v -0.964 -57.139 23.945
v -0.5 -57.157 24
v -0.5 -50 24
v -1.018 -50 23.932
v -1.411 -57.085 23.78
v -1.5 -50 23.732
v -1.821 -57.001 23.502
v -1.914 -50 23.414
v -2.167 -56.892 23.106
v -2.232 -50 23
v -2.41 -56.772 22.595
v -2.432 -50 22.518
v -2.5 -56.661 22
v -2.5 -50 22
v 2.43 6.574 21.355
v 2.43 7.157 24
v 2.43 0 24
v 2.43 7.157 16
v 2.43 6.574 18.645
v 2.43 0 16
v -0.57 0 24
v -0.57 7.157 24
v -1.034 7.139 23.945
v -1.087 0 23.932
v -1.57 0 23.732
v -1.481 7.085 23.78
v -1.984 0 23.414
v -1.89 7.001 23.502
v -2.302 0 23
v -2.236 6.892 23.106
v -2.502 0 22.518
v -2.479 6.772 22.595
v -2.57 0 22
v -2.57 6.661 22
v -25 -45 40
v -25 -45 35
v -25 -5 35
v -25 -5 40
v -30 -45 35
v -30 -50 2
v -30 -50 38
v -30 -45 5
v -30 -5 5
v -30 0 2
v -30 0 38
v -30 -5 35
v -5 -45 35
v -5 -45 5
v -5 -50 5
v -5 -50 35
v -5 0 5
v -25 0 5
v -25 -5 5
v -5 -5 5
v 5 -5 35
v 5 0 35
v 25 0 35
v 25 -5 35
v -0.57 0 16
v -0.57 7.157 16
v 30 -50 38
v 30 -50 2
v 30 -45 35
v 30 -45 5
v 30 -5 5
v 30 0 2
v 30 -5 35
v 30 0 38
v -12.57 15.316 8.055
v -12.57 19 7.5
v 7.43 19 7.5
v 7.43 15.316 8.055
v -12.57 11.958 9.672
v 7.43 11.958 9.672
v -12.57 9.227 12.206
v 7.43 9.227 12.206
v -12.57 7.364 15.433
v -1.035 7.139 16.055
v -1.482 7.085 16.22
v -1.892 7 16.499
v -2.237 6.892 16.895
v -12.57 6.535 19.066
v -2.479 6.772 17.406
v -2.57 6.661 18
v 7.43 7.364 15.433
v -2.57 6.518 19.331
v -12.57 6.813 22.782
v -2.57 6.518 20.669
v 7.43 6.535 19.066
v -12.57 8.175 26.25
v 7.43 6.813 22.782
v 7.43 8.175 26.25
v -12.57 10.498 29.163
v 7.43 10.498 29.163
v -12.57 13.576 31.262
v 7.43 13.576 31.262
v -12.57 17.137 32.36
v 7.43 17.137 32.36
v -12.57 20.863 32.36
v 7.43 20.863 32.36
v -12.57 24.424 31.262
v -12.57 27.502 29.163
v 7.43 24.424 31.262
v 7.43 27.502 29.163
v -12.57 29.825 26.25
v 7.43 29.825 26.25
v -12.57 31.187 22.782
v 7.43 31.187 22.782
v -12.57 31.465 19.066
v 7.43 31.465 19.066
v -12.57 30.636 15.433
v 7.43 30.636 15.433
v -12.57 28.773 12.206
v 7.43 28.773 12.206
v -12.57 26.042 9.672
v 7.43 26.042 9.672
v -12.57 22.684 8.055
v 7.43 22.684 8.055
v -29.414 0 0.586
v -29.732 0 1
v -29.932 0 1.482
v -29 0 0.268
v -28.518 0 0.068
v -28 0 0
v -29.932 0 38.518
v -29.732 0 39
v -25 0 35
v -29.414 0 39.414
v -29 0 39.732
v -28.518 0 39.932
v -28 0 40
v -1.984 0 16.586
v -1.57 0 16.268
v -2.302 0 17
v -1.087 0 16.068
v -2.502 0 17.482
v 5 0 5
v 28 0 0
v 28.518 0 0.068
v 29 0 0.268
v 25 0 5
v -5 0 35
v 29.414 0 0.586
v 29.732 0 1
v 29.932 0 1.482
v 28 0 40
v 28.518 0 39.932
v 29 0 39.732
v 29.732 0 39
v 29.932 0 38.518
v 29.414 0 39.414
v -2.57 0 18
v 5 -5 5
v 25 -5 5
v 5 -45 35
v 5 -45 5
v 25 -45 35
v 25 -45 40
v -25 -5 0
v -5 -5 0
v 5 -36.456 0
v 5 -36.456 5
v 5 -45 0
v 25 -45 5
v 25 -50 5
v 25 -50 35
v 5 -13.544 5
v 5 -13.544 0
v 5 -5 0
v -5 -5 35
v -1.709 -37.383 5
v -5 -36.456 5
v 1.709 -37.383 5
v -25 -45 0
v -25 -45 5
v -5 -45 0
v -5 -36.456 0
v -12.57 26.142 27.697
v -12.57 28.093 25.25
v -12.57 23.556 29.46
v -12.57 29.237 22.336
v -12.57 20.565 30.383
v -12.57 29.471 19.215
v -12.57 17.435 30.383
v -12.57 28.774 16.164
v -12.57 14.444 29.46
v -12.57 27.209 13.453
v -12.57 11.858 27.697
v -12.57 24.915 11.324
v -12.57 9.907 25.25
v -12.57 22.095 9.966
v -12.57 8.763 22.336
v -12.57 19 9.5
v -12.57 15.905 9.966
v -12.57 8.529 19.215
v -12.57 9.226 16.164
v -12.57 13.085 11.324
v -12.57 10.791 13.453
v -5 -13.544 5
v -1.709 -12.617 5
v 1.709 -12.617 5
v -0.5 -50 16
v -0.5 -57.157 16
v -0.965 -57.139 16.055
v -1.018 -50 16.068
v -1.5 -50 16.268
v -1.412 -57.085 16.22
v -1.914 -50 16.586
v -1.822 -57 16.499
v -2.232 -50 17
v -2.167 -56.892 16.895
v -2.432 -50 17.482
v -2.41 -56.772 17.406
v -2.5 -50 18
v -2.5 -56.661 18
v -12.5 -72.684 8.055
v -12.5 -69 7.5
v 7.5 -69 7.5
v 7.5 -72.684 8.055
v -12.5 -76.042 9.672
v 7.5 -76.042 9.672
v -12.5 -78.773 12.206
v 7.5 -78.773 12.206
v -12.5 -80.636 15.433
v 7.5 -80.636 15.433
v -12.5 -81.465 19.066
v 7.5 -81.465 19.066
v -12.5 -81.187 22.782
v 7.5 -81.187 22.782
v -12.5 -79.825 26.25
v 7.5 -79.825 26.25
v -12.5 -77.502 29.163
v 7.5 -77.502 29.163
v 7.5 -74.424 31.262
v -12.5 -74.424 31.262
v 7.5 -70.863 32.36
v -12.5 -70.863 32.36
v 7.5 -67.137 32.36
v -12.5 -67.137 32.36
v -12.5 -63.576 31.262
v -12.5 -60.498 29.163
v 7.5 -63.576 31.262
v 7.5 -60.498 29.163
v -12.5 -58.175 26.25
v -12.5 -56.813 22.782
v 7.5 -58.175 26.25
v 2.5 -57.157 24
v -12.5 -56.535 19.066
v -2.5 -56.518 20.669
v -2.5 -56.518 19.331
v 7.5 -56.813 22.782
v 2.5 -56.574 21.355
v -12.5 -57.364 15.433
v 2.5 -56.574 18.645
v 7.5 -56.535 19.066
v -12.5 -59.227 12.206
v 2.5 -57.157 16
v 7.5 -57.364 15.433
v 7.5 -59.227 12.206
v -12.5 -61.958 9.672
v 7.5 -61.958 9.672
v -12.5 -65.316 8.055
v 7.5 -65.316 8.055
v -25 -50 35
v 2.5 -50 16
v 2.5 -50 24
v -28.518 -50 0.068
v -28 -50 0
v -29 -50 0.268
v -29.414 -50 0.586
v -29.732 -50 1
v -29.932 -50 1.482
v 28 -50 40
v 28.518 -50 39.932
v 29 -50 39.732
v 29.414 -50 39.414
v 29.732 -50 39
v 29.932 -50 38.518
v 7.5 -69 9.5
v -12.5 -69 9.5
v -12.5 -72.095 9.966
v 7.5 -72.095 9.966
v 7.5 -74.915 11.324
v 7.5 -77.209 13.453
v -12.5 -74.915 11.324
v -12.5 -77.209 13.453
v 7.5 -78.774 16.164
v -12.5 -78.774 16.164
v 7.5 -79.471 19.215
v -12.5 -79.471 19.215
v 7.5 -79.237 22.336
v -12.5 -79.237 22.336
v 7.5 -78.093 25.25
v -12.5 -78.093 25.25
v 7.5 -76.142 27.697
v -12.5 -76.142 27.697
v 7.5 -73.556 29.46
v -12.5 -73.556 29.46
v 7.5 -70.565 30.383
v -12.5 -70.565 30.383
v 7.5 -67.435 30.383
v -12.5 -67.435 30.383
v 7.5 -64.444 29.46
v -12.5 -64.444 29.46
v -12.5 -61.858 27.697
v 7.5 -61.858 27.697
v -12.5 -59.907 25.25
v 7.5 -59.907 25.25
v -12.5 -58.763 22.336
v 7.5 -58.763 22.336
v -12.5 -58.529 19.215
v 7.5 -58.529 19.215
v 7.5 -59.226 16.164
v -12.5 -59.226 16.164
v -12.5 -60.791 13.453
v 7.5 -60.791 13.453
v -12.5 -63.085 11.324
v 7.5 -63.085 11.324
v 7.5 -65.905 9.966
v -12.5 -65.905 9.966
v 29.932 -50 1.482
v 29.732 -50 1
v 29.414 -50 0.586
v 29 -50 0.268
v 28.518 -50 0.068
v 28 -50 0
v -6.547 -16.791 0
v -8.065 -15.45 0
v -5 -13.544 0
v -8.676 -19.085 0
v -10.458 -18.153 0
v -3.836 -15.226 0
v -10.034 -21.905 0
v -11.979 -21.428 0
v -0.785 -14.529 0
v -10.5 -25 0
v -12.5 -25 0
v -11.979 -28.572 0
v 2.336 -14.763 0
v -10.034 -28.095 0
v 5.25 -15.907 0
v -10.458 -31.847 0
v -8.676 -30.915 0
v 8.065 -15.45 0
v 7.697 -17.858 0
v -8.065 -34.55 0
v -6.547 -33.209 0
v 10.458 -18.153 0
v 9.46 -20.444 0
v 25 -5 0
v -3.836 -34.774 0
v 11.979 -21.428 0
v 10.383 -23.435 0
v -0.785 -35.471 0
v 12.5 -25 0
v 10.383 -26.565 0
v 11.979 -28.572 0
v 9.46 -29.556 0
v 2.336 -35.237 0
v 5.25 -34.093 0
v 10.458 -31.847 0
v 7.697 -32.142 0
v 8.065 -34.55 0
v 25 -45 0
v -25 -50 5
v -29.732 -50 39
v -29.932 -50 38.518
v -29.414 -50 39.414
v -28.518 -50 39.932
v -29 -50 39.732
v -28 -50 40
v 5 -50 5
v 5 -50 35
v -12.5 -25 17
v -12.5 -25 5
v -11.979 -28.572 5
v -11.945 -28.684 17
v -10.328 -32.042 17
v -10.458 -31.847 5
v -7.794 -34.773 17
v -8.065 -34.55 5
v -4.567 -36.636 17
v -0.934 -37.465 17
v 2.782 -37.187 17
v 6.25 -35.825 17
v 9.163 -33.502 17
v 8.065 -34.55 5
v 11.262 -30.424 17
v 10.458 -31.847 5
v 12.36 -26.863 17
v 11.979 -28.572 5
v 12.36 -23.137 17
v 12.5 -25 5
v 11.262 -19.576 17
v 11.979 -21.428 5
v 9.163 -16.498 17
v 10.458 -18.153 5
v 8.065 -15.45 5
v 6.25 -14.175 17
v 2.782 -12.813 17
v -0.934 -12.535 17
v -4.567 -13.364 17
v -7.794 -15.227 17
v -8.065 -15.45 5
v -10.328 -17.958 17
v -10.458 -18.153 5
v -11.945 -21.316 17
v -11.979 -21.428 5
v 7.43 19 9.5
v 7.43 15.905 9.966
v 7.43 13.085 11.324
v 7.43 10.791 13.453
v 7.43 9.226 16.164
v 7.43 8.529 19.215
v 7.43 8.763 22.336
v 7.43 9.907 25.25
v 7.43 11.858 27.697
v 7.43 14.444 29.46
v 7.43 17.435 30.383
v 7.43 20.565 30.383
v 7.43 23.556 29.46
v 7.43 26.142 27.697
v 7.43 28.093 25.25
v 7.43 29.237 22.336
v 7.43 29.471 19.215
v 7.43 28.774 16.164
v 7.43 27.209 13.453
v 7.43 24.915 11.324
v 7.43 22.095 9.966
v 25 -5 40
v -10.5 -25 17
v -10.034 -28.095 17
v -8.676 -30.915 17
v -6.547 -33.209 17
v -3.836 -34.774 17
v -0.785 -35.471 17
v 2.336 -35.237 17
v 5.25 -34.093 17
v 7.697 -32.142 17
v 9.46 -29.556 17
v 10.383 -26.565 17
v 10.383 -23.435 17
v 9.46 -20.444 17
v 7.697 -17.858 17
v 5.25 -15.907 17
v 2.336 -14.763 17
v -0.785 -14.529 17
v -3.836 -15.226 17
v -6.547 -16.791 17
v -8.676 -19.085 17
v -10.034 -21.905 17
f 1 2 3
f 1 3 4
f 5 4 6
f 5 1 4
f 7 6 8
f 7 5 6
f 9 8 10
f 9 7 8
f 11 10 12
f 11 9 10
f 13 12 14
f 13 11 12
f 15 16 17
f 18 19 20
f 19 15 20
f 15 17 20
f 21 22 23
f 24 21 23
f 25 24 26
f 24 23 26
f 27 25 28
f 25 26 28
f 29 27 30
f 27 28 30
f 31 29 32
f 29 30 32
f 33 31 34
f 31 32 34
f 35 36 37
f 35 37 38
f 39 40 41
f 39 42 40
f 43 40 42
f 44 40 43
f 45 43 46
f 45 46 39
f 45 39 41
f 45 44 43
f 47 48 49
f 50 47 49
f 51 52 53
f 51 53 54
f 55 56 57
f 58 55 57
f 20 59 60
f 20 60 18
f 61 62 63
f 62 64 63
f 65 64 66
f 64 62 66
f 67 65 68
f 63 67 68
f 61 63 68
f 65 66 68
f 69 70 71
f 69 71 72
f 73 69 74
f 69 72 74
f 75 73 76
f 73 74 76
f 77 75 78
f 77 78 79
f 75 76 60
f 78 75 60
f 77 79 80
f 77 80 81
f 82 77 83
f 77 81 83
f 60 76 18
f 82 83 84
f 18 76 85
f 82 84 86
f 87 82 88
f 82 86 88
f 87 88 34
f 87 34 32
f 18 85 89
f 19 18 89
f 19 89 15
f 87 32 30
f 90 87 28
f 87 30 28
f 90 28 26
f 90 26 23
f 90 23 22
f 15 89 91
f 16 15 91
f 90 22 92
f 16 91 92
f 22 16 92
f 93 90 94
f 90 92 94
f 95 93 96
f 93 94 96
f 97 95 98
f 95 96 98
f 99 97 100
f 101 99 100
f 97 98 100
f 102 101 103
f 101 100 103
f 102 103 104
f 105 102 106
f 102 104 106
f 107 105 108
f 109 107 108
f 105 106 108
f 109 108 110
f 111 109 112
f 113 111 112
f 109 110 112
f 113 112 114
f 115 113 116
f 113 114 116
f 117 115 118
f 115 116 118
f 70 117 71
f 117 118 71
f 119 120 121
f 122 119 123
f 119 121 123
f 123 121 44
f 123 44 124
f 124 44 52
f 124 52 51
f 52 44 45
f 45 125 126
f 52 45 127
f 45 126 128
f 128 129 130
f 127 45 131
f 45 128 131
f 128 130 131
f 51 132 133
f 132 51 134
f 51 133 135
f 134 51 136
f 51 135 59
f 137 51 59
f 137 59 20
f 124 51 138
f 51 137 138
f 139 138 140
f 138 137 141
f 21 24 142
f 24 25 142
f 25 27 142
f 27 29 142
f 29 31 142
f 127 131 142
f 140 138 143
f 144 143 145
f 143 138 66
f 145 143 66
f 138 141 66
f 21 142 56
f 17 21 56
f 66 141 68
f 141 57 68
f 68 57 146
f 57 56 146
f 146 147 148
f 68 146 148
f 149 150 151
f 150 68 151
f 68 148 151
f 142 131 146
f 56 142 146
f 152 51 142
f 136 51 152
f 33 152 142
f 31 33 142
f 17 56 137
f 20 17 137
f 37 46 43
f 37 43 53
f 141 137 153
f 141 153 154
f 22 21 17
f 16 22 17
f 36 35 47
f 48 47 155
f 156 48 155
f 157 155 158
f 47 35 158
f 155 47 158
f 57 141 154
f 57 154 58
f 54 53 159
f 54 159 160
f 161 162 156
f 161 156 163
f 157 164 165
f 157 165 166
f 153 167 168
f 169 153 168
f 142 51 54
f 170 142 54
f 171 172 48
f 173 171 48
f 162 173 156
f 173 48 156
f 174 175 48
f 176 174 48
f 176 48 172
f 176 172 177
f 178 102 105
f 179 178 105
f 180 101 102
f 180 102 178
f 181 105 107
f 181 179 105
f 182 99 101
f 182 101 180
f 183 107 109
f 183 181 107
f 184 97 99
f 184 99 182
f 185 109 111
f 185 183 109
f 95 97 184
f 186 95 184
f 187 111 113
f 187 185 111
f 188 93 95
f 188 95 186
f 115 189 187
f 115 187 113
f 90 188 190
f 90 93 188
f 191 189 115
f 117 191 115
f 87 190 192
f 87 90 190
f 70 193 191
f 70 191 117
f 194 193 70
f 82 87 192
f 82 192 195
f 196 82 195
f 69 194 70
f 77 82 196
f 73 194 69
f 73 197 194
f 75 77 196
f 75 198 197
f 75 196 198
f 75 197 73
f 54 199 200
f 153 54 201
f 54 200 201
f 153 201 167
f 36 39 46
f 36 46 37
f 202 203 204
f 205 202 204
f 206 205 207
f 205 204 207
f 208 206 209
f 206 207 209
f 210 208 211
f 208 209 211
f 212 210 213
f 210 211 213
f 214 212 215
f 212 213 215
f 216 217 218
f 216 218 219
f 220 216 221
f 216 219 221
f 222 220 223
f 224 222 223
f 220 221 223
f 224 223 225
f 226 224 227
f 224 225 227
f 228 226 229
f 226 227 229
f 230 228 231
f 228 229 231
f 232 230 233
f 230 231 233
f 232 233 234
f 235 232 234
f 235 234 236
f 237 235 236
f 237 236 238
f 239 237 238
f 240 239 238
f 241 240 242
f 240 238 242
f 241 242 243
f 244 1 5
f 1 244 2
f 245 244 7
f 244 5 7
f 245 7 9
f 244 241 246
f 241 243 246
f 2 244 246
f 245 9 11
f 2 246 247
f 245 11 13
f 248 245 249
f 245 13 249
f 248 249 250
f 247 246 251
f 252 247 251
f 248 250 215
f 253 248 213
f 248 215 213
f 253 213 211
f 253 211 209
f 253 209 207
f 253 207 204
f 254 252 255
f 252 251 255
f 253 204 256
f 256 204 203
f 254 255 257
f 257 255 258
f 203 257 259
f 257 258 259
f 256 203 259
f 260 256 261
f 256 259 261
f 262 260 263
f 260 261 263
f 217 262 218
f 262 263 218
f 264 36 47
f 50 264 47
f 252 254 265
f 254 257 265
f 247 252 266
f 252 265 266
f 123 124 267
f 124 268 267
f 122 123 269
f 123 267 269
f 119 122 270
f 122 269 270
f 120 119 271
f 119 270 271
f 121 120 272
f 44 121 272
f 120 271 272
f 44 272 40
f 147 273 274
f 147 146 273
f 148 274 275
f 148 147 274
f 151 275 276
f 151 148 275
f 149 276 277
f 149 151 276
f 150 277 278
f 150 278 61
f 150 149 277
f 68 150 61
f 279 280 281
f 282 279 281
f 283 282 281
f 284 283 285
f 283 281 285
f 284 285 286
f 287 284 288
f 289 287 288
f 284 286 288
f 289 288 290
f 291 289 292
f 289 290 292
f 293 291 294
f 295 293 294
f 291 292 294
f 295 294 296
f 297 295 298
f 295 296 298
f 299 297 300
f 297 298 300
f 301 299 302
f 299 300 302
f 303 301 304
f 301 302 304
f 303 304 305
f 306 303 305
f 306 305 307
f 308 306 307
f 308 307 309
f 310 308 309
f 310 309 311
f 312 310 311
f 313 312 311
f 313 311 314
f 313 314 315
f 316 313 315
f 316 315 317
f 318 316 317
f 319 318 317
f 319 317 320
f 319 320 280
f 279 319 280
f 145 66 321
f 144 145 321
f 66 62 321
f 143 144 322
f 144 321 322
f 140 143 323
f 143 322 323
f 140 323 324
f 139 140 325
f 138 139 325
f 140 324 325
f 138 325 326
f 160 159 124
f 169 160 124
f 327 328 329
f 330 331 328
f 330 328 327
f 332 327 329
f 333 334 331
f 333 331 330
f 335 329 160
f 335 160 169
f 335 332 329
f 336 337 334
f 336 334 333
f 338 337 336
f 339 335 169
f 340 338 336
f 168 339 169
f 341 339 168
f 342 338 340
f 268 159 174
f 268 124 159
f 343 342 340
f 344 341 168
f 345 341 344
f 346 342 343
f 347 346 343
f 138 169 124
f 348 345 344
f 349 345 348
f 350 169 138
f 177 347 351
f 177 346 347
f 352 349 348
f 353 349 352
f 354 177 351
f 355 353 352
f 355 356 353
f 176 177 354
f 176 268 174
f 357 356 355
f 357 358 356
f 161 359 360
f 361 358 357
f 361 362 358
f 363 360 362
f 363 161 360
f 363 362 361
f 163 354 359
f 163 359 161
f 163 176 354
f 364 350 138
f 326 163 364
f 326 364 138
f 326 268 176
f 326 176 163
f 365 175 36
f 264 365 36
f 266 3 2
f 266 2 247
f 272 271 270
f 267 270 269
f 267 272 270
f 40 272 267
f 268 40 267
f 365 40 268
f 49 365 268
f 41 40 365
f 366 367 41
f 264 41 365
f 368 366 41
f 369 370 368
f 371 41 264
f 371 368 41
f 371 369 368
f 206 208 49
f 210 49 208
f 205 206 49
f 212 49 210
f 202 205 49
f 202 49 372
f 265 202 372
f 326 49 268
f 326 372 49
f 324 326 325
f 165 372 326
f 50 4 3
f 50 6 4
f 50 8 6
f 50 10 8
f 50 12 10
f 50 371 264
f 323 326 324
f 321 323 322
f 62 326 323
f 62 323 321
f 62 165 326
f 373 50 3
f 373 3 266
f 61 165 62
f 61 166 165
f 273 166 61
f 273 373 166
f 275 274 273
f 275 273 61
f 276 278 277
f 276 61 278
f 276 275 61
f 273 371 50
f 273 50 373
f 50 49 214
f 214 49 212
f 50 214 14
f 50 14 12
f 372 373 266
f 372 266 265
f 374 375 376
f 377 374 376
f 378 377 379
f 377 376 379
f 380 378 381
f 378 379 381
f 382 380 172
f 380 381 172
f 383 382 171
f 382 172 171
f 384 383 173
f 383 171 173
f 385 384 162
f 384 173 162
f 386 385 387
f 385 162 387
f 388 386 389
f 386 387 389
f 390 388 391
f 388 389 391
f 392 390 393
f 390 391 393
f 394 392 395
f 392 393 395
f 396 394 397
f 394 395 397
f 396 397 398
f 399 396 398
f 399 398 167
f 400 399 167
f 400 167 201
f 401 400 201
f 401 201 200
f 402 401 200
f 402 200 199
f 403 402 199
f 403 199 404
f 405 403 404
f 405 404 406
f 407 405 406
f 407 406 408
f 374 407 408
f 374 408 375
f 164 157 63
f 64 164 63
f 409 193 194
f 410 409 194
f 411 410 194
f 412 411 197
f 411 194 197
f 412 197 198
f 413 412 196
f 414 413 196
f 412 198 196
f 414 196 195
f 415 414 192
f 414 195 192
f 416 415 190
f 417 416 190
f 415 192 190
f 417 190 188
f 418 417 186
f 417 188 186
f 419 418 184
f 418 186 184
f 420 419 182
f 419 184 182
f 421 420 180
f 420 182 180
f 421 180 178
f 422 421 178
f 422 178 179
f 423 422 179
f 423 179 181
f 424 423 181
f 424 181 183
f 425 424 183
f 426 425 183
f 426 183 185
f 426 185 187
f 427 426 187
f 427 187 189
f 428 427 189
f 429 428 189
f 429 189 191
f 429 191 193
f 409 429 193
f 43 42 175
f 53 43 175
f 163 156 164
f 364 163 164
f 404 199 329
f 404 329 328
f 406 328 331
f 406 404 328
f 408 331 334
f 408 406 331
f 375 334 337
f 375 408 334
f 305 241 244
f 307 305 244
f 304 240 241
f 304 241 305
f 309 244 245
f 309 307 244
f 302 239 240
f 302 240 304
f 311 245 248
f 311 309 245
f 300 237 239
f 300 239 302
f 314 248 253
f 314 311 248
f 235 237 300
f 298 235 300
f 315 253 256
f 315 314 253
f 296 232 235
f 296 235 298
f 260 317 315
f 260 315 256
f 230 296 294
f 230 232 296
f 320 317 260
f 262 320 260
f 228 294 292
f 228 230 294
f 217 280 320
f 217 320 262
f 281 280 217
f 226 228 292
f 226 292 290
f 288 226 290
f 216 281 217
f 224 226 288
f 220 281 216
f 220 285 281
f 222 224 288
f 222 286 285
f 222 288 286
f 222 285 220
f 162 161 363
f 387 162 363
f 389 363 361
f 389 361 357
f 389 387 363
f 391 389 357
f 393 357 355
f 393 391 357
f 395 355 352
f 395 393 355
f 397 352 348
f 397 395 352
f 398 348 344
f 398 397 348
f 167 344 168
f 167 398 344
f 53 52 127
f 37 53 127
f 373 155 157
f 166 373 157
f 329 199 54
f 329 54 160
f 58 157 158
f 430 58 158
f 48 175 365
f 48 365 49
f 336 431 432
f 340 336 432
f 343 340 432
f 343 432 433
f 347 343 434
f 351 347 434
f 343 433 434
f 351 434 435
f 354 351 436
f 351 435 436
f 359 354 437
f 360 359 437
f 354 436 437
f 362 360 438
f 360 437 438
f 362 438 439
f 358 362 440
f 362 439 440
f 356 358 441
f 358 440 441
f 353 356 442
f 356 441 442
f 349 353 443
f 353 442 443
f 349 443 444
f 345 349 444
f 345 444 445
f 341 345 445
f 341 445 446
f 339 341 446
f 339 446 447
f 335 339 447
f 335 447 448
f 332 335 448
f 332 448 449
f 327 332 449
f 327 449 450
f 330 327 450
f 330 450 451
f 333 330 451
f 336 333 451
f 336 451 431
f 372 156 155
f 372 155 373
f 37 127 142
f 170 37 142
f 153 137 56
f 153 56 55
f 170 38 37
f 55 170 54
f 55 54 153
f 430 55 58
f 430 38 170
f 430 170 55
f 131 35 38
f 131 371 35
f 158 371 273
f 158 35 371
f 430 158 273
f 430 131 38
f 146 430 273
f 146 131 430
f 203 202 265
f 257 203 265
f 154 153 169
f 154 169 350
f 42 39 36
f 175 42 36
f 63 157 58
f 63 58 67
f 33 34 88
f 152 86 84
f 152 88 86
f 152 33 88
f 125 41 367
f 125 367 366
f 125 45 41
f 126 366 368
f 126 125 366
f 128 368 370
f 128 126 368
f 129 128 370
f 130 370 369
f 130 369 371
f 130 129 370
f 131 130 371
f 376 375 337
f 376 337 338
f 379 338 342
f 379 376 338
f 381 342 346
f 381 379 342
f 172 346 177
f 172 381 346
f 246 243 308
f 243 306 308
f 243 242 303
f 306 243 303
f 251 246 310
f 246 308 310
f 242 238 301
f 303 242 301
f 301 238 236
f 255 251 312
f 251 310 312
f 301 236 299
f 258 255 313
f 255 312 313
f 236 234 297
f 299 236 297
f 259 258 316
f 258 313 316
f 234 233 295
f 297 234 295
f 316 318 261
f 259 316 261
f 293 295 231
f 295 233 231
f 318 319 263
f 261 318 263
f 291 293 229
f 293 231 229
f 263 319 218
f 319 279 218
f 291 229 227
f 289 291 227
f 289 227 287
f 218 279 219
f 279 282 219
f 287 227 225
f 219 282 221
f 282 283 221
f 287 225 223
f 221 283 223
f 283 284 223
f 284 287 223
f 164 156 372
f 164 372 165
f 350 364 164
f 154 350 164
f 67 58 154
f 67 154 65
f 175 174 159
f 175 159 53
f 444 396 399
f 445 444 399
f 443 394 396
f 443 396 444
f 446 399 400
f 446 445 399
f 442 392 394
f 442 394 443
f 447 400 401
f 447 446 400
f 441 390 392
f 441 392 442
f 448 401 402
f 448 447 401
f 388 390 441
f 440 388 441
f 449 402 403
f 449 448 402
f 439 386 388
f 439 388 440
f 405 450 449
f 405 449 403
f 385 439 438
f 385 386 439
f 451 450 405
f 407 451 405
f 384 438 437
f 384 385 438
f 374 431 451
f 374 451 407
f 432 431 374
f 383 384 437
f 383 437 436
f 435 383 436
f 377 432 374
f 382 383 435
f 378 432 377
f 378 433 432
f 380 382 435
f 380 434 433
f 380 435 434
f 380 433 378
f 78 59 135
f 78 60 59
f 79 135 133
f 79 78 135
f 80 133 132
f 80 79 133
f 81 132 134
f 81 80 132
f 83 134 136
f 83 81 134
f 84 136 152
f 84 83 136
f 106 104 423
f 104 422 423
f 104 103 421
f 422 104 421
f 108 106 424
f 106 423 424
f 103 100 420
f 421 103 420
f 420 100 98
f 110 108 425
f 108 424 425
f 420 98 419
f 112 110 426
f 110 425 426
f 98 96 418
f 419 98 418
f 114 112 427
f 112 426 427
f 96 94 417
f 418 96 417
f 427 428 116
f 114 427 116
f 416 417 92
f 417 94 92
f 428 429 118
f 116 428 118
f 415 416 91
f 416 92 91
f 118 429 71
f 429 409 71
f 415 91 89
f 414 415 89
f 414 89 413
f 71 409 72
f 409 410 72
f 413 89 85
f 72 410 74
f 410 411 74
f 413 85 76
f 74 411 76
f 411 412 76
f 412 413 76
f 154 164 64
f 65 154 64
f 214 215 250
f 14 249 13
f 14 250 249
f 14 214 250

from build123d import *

# Parameters (mm, degrees)
SKETCH_W          = 60
SKETCH_H          = 40
SKETCH_W_2        = 50
SKETCH_H_2        = 30
PAD_DEPTH         = 5
SKETCH001_W       = 5
SKETCH001_H       = 5
PAD001_DEPTH      = 40
SKETCH002_W       = 60
SKETCH002_H       = 40
SKETCH002_W_2     = 50
SKETCH002_H_2     = 30
PAD002_DEPTH      = 5
SKETCH003_W       = 10
SKETCH003_H       = 5
PAD003_DEPTH      = 30
SKETCH004_W       = 5
SKETCH004_H       = 8
PAD004_DEPTH      = 10
SKETCH005_R       = 12.5
PAD005_DEPTH      = 10
PAD005_DEPTH_BACK = 10
SKETCH006_R       = 10.5
POCKET_DEPTH      = 42.501
SKETCH007_W       = 5
SKETCH007_H       = 8
PAD006_DEPTH      = 10
SKETCH008_R       = 12.5
PAD007_DEPTH      = 10
PAD007_DEPTH_BACK = 10
SKETCH009_R       = 10.5
POCKET001_DEPTH   = 42.570779
SKETCH010_W       = 10
SKETCH010_H       = 5
PAD008_DEPTH      = 40
SKETCH011_R       = 12.5
PAD009_DEPTH      = 12
PAD009_DEPTH_BACK = 5
SKETCH012_R       = 10.5
POCKET002_DEPTH   = 17.001
FILLET_R          = 2
FILLET001_R       = 2
FILLET002_R       = 2
FILLET003_R       = 2
FILLET004_R       = 2
FILLET005_R       = 2
FILLET006_R       = 2
FILLET007_R       = 2


with BuildPart() as part:
    # Sketch → Pad (new body)
    with BuildSketch(Plane.XZ):
        with Locations((0, 20)):
            Rectangle(SKETCH_W, SKETCH_H)
        with Locations((0, 20)):
            Rectangle(SKETCH_W_2, SKETCH_H_2, mode=Mode.SUBTRACT)
    extrude(amount=PAD_DEPTH)

    # Sketch001 (on Face10 of Pad) → Pad001 (join)
    with BuildSketch(Plane.XZ.offset(5)):
        with Locations((-27.5, 37.5)):
            Rectangle(SKETCH001_W, SKETCH001_H)
        with Locations((27.5, 37.5)):
            Rectangle(SKETCH001_W, SKETCH001_H)
        with Locations((27.5, 2.5)):
            Rectangle(SKETCH001_W, SKETCH001_H)
        with Locations((-27.5, 2.5)):
            Rectangle(SKETCH001_W, SKETCH001_H)
    extrude(amount=PAD001_DEPTH)

    # Sketch002 (on Face10 of Pad001) → Pad002 (join)
    with BuildSketch(Plane.XZ.offset(45)):
        with Locations((0, 20)):
            Rectangle(SKETCH002_W, SKETCH002_H)
        with Locations((0, 20)):
            Rectangle(SKETCH002_W_2, SKETCH002_H_2, mode=Mode.SUBTRACT)
    extrude(amount=PAD002_DEPTH)

    # Sketch003 (on Face26 of Pad002) → Pad003 (join)
    with BuildSketch(Plane(origin=(0, 0, 5), x_dir=(-1, 0, 0), z_dir=(0, 0, 1))):
        with Locations((0, 47.5)):
            Rectangle(SKETCH003_W, SKETCH003_H)
        with Locations((0, 2.5)):
            Rectangle(SKETCH003_W, SKETCH003_H)
    extrude(amount=PAD003_DEPTH)

    # Sketch004 (on Face36 of Pad003) → Pad004 (join)
    with BuildSketch(Plane.XZ.offset(50)):
        with Locations((0, 20)):
            Rectangle(SKETCH004_W, SKETCH004_H)
    extrude(amount=PAD004_DEPTH)

    # Sketch005 (on Face19 of Pad004) → Pad005 (join, two sides)
    with BuildSketch(Plane(origin=(-2.5, 0, 0), x_dir=(0, 0, -1), z_dir=(-1, 0, 0))) as pad005_sk:
        with Locations((-20, 69)):
            Circle(SKETCH005_R)
    extrude(amount=PAD005_DEPTH)
    extrude(pad005_sk.sketch, amount=-PAD005_DEPTH_BACK)

    # Sketch006 (on Face43 of Pad005) → Pocket (cut, through all)
    with BuildSketch(Plane(origin=(-12.5, 0, 0), x_dir=(0, 0, -1), z_dir=(-1, 0, 0))):
        with Locations((-20, 69)):
            Circle(SKETCH006_R)
        with Locations((-20, 69)):
            Circle(SKETCH006_R)
    extrude(amount=-POCKET_DEPTH, mode=Mode.SUBTRACT)

    # Sketch007 (on Face26 of Pocket) → Pad006 (join)
    with BuildSketch(Plane(origin=(0, 0, 0), x_dir=(1, 0, 0), z_dir=(0, 1, 0))):
        with Locations((-0.069779, -20)):
            Rectangle(SKETCH007_W, SKETCH007_H)
    extrude(amount=PAD006_DEPTH)

    # Sketch008 (on Face42 of Pad006) → Pad007 (join, two sides)
    with BuildSketch(Plane(origin=(-2.569779, 0, 0), x_dir=(0, 0, -1), z_dir=(-1, 0, 0))) as pad007_sk:
        with Locations((-20, -19)):
            Circle(SKETCH008_R)
    extrude(amount=PAD007_DEPTH)
    extrude(pad007_sk.sketch, amount=-PAD007_DEPTH_BACK)

    # Sketch009 (on Face51 of Pad007) → Pocket001 (cut, through all)
    with BuildSketch(Plane(origin=(-12.569779, 0, 0), x_dir=(0, 0, -1), z_dir=(-1, 0, 0))):
        with Locations((-20, -19)):
            Circle(SKETCH009_R)
    extrude(amount=-POCKET001_DEPTH, mode=Mode.SUBTRACT)

    # Sketch010 (on Face2 of Pocket001) → Pad008 (join)
    with BuildSketch(Plane(origin=(0, -45, 0), x_dir=(1, 0, 0), z_dir=(0, 1, 0))):
        with Locations((0, -2.5)):
            Rectangle(SKETCH010_W, SKETCH010_H)
    extrude(amount=PAD008_DEPTH)

    # Sketch011 (on Face22 of Pad008) → Pad009 (join, two sides)
    with BuildSketch(Plane(origin=(0, 0, 5), x_dir=(-1, 0, 0), z_dir=(0, 0, 1))) as pad009_sk:
        with Locations((0, 25)):
            Circle(SKETCH011_R)
    extrude(amount=PAD009_DEPTH)
    extrude(pad009_sk.sketch, amount=-PAD009_DEPTH_BACK)

    # Sketch012 (on Face44 of Pad009) → Pocket002 (cut, through all)
    with BuildSketch(Plane(origin=(0, 0, 17), x_dir=(-1, 0, 0), z_dir=(0, 0, 1))):
        with Locations((0, 25)):
            Circle(SKETCH012_R)
    extrude(amount=-POCKET002_DEPTH, mode=Mode.SUBTRACT)

    # Fillet
    fillet_edges = [part.edges().sort_by_distance(p)[0] for p in [
        (-30, -25, 40),
    ]]
    fillet(fillet_edges, radius=FILLET_R)

    # Fillet001
    fillet001_edges = [part.edges().sort_by_distance(p)[0] for p in [
        (-30, -25, 0),
    ]]
    fillet(fillet001_edges, radius=FILLET001_R)

    # Fillet002
    fillet002_edges = [part.edges().sort_by_distance(p)[0] for p in [
        (30, -25, 40),
    ]]
    fillet(fillet002_edges, radius=FILLET002_R)

    # Fillet003
    fillet003_edges = [part.edges().sort_by_distance(p)[0] for p in [
        (30, -25, 0),
    ]]
    fillet(fillet003_edges, radius=FILLET003_R)

    # Fillet004
    fillet004_edges = [part.edges().sort_by_distance(p)[0] for p in [
        (-2.5, -53.57864, 24),
    ]]
    fillet(fillet004_edges, radius=FILLET004_R)

    # Fillet005
    fillet005_edges = [part.edges().sort_by_distance(p)[0] for p in [
        (-2.5, -53.57864, 16),
    ]]
    fillet(fillet005_edges, radius=FILLET005_R)

    # Fillet006
    fillet006_edges = [part.edges().sort_by_distance(p)[0] for p in [
        (-2.569779, 3.57864, 24),
    ]]
    fillet(fillet006_edges, radius=FILLET006_R)

    # Fillet007
    fillet007_edges = [part.edges().sort_by_distance(p)[0] for p in [
        (-2.569779, 3.57864, 16),
    ]]
    fillet(fillet007_edges, radius=FILLET007_R)


solid = part.part
